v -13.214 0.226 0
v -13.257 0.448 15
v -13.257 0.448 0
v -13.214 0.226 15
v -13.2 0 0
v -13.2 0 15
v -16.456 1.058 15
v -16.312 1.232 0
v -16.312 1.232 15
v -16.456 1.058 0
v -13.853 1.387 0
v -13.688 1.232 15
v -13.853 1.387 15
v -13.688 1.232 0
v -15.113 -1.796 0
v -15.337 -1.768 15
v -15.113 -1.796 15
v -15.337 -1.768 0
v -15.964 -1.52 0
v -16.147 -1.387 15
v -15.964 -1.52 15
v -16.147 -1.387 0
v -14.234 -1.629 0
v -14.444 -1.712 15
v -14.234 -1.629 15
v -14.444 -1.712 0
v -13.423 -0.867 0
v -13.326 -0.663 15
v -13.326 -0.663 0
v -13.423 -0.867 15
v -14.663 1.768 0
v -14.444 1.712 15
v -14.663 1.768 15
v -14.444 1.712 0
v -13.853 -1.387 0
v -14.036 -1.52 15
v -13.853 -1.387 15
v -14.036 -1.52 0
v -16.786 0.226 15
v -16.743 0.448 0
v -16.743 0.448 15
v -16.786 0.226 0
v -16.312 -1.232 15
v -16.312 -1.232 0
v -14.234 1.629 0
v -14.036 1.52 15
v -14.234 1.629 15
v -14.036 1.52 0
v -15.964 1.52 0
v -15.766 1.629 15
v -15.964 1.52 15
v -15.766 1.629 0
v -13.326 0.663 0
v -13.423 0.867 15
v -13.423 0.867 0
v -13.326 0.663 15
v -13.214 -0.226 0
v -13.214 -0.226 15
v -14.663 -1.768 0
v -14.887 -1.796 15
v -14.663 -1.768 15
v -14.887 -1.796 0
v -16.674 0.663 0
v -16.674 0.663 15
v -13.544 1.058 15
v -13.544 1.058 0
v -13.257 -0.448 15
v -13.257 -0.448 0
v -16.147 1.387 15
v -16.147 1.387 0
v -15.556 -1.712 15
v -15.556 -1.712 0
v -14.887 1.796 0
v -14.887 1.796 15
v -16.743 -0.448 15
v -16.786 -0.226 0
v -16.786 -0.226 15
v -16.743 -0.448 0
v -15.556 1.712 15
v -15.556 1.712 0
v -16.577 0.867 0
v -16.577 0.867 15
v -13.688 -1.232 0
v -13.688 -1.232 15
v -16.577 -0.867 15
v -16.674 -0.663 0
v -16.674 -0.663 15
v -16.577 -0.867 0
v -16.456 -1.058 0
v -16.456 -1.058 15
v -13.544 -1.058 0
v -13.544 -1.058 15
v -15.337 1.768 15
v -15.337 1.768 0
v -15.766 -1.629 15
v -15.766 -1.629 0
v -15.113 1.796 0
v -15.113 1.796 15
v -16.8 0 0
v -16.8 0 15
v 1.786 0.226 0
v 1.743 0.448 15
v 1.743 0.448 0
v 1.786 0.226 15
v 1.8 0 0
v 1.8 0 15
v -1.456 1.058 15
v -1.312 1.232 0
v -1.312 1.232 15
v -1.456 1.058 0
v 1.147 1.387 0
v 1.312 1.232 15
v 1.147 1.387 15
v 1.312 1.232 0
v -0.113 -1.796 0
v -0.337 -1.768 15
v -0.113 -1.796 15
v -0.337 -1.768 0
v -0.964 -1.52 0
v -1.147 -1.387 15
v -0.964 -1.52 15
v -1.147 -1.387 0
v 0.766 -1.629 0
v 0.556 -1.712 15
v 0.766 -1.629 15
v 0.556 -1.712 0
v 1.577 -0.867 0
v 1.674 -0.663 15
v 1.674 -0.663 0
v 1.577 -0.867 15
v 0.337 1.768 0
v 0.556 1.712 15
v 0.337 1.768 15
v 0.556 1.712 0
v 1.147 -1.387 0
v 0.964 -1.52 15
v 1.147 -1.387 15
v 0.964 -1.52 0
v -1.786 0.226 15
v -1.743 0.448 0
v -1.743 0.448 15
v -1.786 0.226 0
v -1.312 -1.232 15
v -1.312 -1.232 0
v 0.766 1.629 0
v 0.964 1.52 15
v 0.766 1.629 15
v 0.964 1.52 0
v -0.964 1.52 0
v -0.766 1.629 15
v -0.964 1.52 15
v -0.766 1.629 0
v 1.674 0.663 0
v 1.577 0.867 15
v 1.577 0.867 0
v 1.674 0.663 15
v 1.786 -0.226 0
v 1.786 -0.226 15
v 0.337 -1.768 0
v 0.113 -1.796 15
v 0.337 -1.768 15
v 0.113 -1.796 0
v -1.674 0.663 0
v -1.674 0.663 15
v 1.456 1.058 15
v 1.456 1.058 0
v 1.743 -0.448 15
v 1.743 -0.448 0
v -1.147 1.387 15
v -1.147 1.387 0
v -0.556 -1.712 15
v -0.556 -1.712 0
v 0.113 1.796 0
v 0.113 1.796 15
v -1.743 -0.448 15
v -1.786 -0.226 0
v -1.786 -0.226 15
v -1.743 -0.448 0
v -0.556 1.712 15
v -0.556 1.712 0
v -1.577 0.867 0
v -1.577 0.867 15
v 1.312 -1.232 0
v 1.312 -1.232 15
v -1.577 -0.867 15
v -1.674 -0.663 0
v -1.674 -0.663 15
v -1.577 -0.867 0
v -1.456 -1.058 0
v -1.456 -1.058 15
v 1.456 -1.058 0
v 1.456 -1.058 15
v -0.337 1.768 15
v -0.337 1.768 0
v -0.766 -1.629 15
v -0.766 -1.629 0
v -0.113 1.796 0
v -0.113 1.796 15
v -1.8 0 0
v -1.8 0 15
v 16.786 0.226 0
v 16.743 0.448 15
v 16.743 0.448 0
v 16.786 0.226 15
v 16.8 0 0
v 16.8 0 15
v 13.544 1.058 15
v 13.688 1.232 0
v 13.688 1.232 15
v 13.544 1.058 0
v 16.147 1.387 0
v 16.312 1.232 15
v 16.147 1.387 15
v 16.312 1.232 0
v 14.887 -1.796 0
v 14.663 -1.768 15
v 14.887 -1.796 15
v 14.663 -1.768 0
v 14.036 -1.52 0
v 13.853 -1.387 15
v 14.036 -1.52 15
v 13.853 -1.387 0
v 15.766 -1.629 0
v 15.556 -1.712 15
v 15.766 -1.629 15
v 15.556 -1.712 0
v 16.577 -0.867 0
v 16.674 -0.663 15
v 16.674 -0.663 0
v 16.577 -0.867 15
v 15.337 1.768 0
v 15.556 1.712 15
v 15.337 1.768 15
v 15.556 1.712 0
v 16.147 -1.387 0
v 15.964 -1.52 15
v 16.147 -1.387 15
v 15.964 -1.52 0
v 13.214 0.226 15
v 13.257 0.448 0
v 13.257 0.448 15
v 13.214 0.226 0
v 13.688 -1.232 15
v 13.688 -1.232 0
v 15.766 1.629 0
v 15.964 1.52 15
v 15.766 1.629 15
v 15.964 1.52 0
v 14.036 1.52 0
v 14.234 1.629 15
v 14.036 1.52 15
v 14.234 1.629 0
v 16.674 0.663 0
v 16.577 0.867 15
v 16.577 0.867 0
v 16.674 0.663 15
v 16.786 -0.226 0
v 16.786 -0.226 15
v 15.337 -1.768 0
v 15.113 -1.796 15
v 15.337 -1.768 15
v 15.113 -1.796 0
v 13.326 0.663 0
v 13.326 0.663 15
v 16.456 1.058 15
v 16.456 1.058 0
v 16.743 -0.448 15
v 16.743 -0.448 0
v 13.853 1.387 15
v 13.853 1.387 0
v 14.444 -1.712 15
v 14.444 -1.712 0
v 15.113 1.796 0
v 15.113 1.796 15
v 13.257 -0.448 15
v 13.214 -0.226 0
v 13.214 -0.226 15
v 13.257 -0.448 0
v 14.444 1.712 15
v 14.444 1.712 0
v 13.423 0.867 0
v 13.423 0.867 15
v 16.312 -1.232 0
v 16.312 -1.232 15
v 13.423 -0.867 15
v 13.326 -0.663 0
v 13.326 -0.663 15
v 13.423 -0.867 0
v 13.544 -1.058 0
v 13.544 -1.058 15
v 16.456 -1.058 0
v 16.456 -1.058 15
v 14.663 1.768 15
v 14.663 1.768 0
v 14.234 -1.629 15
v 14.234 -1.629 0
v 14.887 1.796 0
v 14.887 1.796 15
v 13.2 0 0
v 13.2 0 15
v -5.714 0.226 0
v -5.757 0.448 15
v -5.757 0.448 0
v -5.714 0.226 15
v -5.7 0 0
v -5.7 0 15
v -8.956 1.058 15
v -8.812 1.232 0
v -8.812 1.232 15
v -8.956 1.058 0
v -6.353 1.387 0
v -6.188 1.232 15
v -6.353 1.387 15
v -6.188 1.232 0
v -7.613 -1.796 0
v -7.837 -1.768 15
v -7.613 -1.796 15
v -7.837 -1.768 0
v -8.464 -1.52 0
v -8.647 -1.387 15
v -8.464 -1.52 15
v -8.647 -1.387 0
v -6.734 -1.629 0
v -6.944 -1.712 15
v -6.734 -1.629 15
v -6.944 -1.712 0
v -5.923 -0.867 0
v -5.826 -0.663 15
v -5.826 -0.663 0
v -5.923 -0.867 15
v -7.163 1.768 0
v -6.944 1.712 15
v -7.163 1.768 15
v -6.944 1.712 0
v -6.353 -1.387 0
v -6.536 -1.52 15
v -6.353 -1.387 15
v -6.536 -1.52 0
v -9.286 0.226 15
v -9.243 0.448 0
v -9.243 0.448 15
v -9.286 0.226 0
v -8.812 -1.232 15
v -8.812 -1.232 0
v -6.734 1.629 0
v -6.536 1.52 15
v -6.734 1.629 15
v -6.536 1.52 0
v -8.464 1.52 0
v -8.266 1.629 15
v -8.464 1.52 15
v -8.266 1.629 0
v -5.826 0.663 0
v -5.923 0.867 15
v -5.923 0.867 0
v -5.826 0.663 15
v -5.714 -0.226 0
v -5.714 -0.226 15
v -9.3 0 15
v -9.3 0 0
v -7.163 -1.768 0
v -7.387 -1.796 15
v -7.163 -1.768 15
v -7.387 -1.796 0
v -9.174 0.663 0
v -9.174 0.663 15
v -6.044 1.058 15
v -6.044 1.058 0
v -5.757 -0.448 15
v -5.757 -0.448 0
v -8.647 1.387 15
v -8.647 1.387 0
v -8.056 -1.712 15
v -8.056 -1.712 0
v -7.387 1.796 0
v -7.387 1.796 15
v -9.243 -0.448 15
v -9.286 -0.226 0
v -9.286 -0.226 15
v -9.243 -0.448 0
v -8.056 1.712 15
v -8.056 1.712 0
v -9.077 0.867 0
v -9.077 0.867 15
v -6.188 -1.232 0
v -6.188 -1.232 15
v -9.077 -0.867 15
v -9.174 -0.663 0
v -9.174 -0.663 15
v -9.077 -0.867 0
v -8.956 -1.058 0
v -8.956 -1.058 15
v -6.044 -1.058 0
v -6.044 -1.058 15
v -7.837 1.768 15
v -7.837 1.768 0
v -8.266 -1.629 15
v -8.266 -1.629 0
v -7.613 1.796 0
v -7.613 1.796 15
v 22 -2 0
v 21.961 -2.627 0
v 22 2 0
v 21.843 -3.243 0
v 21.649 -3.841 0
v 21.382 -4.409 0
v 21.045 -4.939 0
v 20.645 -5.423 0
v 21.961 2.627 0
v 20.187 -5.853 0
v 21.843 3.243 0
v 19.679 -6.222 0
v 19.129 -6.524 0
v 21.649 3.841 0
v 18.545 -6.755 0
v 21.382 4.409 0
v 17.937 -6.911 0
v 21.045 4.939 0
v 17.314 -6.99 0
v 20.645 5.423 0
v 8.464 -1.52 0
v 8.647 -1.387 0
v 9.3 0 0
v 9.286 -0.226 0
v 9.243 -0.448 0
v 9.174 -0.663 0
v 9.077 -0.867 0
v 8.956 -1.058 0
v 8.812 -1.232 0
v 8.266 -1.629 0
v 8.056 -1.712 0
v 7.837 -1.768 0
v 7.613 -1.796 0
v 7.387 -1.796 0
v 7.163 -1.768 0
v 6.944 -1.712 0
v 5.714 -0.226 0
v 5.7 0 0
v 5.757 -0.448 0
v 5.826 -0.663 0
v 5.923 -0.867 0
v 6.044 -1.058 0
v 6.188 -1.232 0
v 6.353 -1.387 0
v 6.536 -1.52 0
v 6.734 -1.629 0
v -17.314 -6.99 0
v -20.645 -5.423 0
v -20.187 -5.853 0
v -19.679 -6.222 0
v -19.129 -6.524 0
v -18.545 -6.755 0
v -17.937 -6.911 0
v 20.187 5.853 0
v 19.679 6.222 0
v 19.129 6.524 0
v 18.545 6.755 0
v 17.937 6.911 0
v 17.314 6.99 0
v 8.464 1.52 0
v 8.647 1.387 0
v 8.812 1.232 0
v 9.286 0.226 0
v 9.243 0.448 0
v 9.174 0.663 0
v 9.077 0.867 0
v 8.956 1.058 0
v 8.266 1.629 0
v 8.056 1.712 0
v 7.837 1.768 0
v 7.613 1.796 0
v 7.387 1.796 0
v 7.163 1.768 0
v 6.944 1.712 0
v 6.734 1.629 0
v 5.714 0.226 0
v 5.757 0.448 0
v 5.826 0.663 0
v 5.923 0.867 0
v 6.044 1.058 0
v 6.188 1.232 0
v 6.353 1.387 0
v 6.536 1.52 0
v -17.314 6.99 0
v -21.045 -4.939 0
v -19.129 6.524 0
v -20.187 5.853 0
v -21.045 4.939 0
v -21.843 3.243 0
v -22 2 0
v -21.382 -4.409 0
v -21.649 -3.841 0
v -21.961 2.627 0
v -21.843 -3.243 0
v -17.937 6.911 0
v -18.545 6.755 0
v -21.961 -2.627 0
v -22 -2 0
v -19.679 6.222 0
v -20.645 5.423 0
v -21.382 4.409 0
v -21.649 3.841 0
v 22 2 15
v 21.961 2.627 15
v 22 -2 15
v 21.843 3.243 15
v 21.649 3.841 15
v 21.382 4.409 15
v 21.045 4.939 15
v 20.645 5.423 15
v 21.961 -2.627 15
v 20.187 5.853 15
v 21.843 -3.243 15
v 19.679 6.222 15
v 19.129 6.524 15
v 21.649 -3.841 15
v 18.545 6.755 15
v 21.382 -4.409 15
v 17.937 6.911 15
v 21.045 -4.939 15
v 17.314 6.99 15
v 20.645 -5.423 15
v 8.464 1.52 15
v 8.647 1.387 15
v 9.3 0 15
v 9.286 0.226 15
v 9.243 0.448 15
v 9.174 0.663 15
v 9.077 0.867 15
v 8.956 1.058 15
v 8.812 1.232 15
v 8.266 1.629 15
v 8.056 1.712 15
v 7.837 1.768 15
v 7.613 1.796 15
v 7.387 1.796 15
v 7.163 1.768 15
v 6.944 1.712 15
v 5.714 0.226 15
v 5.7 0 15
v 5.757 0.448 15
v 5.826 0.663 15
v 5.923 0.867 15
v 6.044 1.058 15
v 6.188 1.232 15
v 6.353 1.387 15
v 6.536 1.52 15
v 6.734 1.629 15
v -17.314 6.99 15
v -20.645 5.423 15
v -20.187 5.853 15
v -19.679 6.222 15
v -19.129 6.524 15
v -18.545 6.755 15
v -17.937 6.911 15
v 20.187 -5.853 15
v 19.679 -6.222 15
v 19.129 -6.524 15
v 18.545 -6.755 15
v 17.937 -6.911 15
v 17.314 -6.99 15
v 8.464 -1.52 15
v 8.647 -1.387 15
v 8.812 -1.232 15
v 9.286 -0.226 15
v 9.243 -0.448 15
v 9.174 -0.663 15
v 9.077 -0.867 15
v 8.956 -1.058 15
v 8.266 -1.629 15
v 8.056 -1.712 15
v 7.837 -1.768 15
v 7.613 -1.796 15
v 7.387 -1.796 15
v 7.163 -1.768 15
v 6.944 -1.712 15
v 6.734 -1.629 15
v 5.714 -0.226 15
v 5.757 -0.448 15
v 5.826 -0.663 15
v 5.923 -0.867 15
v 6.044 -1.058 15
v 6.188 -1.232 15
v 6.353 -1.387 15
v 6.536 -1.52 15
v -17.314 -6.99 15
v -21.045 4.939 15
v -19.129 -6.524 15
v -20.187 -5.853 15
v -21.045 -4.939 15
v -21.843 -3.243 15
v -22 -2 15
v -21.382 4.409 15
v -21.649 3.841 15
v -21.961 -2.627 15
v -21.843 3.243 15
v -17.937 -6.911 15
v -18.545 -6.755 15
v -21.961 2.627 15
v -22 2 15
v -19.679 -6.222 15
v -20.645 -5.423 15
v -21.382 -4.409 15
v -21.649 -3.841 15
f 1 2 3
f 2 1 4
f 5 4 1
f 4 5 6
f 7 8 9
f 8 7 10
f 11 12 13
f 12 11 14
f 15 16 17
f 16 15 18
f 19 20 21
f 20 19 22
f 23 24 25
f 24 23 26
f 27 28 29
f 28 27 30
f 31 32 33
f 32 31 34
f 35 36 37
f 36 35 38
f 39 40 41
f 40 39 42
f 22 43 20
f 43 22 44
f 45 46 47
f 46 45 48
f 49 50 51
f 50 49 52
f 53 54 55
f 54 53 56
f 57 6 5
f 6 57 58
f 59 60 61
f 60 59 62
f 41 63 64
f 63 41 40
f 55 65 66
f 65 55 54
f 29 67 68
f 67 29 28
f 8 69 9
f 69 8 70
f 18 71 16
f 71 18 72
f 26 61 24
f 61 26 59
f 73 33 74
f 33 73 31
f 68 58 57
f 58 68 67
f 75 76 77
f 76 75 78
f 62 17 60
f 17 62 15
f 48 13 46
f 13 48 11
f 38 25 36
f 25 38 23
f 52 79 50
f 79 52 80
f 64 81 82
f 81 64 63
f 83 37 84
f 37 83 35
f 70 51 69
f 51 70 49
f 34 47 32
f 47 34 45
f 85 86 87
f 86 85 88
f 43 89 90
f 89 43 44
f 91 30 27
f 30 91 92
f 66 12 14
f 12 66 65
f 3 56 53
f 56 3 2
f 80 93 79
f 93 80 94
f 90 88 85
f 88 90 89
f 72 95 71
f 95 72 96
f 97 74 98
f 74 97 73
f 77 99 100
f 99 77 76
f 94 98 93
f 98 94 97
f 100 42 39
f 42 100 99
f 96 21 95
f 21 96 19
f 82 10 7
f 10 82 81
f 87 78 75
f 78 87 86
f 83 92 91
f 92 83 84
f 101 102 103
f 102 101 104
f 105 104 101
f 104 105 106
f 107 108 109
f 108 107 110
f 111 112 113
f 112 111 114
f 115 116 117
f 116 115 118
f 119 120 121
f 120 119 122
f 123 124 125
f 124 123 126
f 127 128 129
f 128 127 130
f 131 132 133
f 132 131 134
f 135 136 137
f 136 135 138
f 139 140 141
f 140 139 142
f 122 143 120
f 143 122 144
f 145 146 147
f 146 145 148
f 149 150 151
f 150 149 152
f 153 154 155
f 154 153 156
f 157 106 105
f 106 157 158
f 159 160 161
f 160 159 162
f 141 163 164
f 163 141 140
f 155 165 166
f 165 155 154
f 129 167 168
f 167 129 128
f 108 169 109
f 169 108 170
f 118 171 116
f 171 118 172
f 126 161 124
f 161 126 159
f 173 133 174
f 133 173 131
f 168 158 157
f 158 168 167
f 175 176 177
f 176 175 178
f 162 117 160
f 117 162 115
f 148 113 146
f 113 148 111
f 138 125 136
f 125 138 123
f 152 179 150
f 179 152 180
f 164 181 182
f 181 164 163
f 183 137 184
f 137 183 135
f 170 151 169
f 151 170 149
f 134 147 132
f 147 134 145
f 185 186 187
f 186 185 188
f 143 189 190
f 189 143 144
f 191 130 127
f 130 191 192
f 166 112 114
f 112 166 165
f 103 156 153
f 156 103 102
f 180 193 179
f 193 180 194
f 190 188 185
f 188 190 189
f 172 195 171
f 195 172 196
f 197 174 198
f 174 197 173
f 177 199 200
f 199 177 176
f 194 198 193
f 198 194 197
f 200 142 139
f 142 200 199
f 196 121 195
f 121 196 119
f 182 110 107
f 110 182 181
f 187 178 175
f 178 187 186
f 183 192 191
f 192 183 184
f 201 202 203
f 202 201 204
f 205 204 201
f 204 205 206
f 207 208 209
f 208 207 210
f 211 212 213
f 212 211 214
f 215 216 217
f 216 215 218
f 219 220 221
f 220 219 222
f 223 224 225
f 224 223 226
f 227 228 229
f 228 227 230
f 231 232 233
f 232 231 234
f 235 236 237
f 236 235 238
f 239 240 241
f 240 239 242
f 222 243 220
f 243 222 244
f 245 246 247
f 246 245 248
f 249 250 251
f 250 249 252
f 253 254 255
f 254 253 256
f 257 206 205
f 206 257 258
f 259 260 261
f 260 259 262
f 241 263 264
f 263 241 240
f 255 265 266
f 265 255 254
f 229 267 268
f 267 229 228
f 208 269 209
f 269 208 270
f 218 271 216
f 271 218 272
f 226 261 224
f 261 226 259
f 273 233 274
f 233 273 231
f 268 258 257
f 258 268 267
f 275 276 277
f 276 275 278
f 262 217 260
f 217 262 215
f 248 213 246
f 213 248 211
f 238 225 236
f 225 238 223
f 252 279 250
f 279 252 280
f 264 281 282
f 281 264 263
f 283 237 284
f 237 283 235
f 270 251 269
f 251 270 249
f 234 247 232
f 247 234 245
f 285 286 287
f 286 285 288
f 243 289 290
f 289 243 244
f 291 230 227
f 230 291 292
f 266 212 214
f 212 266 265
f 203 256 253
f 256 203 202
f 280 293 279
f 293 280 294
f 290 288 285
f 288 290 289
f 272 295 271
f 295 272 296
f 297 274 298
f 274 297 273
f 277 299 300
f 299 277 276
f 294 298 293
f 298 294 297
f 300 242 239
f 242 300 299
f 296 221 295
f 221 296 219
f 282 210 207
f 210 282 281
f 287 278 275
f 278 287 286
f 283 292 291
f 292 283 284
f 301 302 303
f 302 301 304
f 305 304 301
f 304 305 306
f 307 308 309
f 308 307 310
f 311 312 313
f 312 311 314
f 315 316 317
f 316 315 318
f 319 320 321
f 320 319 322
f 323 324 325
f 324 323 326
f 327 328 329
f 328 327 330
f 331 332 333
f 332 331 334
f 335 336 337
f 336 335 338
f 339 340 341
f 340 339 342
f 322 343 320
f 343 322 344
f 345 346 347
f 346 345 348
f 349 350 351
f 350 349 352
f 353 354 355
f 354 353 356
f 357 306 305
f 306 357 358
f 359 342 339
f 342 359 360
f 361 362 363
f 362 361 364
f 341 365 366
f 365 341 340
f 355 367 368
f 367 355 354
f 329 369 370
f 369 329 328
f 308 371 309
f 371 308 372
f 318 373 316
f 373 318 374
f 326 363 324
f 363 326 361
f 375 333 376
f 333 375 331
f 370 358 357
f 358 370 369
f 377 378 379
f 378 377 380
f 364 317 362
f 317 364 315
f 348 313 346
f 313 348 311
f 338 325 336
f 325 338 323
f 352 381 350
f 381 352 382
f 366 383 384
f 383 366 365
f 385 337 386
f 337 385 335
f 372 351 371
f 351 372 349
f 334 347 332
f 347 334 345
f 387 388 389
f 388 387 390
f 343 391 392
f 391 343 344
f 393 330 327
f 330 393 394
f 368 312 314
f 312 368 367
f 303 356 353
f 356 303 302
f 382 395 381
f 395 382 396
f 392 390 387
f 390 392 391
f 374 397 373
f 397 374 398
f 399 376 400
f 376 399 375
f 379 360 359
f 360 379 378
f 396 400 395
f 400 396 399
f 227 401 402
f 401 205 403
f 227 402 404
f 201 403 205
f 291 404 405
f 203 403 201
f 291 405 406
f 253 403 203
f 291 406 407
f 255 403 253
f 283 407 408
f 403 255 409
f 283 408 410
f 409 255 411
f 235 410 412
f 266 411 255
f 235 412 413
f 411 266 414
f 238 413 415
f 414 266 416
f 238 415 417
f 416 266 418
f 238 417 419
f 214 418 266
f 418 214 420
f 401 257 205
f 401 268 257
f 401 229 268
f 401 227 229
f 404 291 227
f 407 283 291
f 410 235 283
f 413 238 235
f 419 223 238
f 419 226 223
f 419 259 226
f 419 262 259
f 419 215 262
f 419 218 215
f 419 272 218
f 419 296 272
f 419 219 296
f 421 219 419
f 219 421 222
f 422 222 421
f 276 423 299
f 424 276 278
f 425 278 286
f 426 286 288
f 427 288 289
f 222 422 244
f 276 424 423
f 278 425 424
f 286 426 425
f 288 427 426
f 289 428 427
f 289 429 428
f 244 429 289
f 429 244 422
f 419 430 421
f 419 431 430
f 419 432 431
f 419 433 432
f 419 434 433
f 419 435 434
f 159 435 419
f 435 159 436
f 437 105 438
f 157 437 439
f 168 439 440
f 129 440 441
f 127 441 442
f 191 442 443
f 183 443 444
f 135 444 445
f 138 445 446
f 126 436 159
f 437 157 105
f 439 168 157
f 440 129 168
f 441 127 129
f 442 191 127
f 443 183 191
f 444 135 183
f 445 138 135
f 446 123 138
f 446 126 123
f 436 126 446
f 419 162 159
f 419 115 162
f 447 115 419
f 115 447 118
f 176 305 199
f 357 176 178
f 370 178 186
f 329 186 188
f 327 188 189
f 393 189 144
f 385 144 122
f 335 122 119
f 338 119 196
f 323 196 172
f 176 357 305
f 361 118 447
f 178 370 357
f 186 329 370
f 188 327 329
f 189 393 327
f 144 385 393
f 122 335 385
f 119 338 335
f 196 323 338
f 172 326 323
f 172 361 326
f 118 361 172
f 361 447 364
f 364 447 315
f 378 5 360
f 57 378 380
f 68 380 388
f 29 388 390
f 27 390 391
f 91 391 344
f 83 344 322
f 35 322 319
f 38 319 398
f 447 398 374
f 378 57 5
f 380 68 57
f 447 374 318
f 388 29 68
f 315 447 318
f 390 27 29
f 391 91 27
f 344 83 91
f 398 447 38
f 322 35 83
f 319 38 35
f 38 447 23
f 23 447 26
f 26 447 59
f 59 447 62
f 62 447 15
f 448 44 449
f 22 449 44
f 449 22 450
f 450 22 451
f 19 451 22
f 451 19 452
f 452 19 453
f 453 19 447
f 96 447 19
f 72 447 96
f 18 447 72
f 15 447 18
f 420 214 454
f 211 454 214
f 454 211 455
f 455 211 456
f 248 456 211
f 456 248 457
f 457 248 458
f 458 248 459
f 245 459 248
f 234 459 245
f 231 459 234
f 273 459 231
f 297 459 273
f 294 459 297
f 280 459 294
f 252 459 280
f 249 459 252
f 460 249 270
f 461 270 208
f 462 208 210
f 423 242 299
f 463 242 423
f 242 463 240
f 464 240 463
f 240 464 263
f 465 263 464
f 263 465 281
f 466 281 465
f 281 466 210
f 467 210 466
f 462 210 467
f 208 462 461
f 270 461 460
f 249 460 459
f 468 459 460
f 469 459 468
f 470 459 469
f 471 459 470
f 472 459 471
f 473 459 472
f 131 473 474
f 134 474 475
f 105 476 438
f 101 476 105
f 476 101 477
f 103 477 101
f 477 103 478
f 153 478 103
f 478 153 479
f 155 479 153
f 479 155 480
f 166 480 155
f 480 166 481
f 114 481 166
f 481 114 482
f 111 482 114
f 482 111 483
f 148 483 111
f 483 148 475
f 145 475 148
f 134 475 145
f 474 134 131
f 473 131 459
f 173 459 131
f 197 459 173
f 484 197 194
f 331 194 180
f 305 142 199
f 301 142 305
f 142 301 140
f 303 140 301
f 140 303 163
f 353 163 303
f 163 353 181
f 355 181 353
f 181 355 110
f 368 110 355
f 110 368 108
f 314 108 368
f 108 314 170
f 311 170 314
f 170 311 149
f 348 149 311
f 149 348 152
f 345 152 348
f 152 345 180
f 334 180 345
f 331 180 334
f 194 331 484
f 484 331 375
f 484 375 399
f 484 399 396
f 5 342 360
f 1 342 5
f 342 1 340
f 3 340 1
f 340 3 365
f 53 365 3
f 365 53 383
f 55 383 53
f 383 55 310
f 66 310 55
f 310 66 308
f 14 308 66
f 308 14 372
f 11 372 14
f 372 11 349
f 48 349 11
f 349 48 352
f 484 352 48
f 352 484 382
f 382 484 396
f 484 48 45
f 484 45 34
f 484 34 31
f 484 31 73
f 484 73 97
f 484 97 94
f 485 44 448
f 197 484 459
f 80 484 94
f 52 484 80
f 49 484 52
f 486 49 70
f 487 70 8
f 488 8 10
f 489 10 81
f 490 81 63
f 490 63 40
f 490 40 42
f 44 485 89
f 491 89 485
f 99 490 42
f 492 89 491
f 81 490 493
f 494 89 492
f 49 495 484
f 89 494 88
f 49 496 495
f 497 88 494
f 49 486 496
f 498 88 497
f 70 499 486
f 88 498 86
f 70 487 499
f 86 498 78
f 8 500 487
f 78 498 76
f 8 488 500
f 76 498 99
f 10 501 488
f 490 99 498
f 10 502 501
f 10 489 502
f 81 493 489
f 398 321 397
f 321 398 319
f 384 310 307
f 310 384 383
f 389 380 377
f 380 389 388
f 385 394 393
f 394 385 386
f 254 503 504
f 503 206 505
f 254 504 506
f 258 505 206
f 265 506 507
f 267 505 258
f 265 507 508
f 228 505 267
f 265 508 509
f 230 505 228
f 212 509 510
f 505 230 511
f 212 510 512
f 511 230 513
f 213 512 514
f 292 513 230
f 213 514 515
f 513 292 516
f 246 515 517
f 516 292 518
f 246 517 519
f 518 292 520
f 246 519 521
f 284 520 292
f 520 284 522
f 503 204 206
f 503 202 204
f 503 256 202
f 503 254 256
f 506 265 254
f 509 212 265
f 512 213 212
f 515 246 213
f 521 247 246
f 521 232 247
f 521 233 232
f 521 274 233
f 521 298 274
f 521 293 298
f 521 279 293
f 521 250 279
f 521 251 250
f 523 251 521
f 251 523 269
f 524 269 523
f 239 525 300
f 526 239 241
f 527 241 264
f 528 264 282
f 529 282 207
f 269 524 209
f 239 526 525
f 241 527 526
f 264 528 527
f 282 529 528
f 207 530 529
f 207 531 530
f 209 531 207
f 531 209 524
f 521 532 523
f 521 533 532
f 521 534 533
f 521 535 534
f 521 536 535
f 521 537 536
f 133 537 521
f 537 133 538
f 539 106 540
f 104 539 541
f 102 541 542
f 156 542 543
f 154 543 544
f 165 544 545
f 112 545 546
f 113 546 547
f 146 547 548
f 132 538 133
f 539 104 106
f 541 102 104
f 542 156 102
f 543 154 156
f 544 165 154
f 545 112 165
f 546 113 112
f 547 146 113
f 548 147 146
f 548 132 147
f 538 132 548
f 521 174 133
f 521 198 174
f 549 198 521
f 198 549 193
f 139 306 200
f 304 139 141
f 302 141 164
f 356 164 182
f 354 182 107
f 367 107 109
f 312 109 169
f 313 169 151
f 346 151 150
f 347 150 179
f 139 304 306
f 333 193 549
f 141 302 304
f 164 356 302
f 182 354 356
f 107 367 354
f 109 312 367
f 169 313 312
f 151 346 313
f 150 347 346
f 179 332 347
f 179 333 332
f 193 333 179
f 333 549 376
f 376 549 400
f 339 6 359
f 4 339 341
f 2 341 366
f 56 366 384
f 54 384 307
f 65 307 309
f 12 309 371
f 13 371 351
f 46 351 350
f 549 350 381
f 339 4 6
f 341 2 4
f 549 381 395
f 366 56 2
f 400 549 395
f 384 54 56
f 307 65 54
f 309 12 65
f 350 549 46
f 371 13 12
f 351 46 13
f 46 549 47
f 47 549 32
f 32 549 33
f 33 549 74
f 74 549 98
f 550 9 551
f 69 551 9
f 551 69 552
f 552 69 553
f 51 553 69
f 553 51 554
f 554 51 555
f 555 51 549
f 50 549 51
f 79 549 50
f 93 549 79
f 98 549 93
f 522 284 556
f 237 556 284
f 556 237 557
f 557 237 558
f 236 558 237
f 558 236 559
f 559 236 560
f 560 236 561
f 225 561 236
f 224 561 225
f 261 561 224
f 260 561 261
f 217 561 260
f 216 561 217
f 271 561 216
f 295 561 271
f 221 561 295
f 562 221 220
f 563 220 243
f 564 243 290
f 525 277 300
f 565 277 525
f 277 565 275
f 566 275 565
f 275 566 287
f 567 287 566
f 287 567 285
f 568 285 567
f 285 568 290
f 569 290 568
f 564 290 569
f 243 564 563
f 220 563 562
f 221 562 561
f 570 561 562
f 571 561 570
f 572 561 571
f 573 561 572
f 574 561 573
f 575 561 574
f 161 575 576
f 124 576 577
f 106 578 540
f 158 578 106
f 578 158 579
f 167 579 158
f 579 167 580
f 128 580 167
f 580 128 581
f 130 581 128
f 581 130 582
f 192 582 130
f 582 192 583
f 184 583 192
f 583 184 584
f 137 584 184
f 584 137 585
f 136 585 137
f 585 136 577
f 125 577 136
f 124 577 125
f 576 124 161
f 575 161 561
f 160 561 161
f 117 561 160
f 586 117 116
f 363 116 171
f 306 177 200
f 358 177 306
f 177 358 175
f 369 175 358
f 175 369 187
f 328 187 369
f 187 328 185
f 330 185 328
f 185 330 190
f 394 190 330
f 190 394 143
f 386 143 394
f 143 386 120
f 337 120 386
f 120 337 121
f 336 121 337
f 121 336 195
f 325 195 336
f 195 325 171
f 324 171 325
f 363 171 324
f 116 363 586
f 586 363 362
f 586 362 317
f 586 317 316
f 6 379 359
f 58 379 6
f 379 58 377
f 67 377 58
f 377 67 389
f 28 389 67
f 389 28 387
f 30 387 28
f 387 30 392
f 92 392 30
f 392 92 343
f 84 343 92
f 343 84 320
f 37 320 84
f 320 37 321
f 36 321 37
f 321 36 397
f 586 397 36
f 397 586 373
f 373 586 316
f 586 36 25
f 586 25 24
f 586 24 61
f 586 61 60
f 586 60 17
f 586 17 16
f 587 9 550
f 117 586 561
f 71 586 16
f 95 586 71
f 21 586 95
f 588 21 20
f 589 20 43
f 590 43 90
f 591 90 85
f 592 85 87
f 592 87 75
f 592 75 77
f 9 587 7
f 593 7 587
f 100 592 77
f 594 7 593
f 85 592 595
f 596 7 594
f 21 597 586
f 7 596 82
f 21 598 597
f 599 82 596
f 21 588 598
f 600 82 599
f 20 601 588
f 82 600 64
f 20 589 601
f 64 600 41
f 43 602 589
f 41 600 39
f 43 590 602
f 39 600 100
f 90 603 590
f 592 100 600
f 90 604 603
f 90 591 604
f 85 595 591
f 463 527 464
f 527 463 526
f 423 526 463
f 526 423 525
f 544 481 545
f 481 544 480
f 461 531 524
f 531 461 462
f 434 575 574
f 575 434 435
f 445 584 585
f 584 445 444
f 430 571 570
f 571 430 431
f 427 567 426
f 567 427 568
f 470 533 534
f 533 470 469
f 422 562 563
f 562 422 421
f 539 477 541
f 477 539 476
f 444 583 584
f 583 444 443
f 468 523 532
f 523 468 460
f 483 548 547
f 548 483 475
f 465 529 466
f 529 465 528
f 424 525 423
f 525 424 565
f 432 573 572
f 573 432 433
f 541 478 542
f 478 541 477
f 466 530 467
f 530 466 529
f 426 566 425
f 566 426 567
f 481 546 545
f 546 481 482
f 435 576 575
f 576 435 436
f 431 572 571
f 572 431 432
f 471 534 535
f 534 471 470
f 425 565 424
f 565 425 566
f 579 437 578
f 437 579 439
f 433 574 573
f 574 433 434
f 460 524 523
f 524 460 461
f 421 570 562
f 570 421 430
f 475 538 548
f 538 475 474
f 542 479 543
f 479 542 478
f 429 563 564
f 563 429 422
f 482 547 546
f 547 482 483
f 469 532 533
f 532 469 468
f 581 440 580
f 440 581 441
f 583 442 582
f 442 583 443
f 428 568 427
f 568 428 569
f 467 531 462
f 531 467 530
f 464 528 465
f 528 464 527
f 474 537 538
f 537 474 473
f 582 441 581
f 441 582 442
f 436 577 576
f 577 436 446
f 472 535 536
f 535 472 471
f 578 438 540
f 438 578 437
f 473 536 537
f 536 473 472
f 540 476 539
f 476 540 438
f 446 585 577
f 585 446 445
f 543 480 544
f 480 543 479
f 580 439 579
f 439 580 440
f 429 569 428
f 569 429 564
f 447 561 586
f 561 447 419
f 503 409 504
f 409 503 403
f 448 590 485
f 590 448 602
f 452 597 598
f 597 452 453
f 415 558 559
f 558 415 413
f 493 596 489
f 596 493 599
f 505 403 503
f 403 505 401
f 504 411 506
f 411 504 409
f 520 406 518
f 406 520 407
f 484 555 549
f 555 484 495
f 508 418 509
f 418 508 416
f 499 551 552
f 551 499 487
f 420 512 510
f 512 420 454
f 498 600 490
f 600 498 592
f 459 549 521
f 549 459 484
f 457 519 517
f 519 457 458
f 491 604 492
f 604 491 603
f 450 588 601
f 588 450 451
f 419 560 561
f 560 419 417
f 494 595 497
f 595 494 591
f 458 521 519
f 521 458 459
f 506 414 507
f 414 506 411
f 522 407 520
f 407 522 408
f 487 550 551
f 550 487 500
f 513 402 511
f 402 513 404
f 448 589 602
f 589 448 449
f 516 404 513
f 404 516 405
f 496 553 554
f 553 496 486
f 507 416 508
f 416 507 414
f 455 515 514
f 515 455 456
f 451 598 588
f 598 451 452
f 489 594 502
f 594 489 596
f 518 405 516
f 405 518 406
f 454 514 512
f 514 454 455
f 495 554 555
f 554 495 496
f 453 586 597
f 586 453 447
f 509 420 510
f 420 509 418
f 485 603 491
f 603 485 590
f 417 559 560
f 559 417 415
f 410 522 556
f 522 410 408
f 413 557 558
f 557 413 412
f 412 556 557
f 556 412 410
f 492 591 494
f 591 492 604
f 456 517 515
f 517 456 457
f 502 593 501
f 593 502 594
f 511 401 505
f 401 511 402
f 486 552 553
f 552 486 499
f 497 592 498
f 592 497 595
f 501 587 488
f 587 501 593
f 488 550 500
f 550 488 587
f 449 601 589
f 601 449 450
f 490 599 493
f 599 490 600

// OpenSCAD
$fn = 50;


difference() {
	union() {
		hull() {
			translate(v = [-17.0000000000, 2.0000000000, 0]) {
				cylinder(h = 15, r = 5);
			}
			translate(v = [17.0000000000, 2.0000000000, 0]) {
				cylinder(h = 15, r = 5);
			}
			translate(v = [-17.0000000000, -2.0000000000, 0]) {
				cylinder(h = 15, r = 5);
			}
			translate(v = [17.0000000000, -2.0000000000, 0]) {
				cylinder(h = 15, r = 5);
			}
		}
	}
	union() {
		translate(v = [-15.0000000000, 0.0000000000, -100.0000000000]) {
			cylinder(h = 200, r = 1.8000000000);
		}
		translate(v = [0.0000000000, 0.0000000000, -100.0000000000]) {
			cylinder(h = 200, r = 1.8000000000);
		}
		translate(v = [15.0000000000, 0.0000000000, -100.0000000000]) {
			cylinder(h = 200, r = 1.8000000000);
		}
		translate(v = [-15.0000000000, 0.0000000000, 0]) {
			cylinder(h = 15, r = 1.8000000000);
		}
		translate(v = [-7.5000000000, 0.0000000000, 0]) {
			cylinder(h = 15, r = 1.8000000000);
		}
		cylinder(h = 15, r = 1.8000000000);
		translate(v = [7.5000000000, 0.0000000000, 0]) {
			cylinder(h = 15, r = 1.8000000000);
		}
		translate(v = [15.0000000000, 0.0000000000, 0]) {
			cylinder(h = 15, r = 1.8000000000);
		}
		translate(v = [-15.0000000000, 0.0000000000, 0]) {
			cylinder(h = 15, r = 1.8000000000);
		}
		translate(v = [-7.5000000000, 0.0000000000, 0]) {
			cylinder(h = 15, r = 1.8000000000);
		}
		cylinder(h = 15, r = 1.8000000000);
		translate(v = [7.5000000000, 0.0000000000, 0]) {
			cylinder(h = 15, r = 1.8000000000);
		}
		translate(v = [15.0000000000, 0.0000000000, 0]) {
			cylinder(h = 15, r = 1.8000000000);
		}
		translate(v = [-15.0000000000, 0.0000000000, 0]) {
			cylinder(h = 15, r = 1.8000000000);
		}
		translate(v = [-7.5000000000, 0.0000000000, 0]) {
			cylinder(h = 15, r = 1.8000000000);
		}
		cylinder(h = 15, r = 1.8000000000);
		translate(v = [7.5000000000, 0.0000000000, 0]) {
			cylinder(h = 15, r = 1.8000000000);
		}
		translate(v = [15.0000000000, 0.0000000000, 0]) {
			cylinder(h = 15, r = 1.8000000000);
		}
	}
}
